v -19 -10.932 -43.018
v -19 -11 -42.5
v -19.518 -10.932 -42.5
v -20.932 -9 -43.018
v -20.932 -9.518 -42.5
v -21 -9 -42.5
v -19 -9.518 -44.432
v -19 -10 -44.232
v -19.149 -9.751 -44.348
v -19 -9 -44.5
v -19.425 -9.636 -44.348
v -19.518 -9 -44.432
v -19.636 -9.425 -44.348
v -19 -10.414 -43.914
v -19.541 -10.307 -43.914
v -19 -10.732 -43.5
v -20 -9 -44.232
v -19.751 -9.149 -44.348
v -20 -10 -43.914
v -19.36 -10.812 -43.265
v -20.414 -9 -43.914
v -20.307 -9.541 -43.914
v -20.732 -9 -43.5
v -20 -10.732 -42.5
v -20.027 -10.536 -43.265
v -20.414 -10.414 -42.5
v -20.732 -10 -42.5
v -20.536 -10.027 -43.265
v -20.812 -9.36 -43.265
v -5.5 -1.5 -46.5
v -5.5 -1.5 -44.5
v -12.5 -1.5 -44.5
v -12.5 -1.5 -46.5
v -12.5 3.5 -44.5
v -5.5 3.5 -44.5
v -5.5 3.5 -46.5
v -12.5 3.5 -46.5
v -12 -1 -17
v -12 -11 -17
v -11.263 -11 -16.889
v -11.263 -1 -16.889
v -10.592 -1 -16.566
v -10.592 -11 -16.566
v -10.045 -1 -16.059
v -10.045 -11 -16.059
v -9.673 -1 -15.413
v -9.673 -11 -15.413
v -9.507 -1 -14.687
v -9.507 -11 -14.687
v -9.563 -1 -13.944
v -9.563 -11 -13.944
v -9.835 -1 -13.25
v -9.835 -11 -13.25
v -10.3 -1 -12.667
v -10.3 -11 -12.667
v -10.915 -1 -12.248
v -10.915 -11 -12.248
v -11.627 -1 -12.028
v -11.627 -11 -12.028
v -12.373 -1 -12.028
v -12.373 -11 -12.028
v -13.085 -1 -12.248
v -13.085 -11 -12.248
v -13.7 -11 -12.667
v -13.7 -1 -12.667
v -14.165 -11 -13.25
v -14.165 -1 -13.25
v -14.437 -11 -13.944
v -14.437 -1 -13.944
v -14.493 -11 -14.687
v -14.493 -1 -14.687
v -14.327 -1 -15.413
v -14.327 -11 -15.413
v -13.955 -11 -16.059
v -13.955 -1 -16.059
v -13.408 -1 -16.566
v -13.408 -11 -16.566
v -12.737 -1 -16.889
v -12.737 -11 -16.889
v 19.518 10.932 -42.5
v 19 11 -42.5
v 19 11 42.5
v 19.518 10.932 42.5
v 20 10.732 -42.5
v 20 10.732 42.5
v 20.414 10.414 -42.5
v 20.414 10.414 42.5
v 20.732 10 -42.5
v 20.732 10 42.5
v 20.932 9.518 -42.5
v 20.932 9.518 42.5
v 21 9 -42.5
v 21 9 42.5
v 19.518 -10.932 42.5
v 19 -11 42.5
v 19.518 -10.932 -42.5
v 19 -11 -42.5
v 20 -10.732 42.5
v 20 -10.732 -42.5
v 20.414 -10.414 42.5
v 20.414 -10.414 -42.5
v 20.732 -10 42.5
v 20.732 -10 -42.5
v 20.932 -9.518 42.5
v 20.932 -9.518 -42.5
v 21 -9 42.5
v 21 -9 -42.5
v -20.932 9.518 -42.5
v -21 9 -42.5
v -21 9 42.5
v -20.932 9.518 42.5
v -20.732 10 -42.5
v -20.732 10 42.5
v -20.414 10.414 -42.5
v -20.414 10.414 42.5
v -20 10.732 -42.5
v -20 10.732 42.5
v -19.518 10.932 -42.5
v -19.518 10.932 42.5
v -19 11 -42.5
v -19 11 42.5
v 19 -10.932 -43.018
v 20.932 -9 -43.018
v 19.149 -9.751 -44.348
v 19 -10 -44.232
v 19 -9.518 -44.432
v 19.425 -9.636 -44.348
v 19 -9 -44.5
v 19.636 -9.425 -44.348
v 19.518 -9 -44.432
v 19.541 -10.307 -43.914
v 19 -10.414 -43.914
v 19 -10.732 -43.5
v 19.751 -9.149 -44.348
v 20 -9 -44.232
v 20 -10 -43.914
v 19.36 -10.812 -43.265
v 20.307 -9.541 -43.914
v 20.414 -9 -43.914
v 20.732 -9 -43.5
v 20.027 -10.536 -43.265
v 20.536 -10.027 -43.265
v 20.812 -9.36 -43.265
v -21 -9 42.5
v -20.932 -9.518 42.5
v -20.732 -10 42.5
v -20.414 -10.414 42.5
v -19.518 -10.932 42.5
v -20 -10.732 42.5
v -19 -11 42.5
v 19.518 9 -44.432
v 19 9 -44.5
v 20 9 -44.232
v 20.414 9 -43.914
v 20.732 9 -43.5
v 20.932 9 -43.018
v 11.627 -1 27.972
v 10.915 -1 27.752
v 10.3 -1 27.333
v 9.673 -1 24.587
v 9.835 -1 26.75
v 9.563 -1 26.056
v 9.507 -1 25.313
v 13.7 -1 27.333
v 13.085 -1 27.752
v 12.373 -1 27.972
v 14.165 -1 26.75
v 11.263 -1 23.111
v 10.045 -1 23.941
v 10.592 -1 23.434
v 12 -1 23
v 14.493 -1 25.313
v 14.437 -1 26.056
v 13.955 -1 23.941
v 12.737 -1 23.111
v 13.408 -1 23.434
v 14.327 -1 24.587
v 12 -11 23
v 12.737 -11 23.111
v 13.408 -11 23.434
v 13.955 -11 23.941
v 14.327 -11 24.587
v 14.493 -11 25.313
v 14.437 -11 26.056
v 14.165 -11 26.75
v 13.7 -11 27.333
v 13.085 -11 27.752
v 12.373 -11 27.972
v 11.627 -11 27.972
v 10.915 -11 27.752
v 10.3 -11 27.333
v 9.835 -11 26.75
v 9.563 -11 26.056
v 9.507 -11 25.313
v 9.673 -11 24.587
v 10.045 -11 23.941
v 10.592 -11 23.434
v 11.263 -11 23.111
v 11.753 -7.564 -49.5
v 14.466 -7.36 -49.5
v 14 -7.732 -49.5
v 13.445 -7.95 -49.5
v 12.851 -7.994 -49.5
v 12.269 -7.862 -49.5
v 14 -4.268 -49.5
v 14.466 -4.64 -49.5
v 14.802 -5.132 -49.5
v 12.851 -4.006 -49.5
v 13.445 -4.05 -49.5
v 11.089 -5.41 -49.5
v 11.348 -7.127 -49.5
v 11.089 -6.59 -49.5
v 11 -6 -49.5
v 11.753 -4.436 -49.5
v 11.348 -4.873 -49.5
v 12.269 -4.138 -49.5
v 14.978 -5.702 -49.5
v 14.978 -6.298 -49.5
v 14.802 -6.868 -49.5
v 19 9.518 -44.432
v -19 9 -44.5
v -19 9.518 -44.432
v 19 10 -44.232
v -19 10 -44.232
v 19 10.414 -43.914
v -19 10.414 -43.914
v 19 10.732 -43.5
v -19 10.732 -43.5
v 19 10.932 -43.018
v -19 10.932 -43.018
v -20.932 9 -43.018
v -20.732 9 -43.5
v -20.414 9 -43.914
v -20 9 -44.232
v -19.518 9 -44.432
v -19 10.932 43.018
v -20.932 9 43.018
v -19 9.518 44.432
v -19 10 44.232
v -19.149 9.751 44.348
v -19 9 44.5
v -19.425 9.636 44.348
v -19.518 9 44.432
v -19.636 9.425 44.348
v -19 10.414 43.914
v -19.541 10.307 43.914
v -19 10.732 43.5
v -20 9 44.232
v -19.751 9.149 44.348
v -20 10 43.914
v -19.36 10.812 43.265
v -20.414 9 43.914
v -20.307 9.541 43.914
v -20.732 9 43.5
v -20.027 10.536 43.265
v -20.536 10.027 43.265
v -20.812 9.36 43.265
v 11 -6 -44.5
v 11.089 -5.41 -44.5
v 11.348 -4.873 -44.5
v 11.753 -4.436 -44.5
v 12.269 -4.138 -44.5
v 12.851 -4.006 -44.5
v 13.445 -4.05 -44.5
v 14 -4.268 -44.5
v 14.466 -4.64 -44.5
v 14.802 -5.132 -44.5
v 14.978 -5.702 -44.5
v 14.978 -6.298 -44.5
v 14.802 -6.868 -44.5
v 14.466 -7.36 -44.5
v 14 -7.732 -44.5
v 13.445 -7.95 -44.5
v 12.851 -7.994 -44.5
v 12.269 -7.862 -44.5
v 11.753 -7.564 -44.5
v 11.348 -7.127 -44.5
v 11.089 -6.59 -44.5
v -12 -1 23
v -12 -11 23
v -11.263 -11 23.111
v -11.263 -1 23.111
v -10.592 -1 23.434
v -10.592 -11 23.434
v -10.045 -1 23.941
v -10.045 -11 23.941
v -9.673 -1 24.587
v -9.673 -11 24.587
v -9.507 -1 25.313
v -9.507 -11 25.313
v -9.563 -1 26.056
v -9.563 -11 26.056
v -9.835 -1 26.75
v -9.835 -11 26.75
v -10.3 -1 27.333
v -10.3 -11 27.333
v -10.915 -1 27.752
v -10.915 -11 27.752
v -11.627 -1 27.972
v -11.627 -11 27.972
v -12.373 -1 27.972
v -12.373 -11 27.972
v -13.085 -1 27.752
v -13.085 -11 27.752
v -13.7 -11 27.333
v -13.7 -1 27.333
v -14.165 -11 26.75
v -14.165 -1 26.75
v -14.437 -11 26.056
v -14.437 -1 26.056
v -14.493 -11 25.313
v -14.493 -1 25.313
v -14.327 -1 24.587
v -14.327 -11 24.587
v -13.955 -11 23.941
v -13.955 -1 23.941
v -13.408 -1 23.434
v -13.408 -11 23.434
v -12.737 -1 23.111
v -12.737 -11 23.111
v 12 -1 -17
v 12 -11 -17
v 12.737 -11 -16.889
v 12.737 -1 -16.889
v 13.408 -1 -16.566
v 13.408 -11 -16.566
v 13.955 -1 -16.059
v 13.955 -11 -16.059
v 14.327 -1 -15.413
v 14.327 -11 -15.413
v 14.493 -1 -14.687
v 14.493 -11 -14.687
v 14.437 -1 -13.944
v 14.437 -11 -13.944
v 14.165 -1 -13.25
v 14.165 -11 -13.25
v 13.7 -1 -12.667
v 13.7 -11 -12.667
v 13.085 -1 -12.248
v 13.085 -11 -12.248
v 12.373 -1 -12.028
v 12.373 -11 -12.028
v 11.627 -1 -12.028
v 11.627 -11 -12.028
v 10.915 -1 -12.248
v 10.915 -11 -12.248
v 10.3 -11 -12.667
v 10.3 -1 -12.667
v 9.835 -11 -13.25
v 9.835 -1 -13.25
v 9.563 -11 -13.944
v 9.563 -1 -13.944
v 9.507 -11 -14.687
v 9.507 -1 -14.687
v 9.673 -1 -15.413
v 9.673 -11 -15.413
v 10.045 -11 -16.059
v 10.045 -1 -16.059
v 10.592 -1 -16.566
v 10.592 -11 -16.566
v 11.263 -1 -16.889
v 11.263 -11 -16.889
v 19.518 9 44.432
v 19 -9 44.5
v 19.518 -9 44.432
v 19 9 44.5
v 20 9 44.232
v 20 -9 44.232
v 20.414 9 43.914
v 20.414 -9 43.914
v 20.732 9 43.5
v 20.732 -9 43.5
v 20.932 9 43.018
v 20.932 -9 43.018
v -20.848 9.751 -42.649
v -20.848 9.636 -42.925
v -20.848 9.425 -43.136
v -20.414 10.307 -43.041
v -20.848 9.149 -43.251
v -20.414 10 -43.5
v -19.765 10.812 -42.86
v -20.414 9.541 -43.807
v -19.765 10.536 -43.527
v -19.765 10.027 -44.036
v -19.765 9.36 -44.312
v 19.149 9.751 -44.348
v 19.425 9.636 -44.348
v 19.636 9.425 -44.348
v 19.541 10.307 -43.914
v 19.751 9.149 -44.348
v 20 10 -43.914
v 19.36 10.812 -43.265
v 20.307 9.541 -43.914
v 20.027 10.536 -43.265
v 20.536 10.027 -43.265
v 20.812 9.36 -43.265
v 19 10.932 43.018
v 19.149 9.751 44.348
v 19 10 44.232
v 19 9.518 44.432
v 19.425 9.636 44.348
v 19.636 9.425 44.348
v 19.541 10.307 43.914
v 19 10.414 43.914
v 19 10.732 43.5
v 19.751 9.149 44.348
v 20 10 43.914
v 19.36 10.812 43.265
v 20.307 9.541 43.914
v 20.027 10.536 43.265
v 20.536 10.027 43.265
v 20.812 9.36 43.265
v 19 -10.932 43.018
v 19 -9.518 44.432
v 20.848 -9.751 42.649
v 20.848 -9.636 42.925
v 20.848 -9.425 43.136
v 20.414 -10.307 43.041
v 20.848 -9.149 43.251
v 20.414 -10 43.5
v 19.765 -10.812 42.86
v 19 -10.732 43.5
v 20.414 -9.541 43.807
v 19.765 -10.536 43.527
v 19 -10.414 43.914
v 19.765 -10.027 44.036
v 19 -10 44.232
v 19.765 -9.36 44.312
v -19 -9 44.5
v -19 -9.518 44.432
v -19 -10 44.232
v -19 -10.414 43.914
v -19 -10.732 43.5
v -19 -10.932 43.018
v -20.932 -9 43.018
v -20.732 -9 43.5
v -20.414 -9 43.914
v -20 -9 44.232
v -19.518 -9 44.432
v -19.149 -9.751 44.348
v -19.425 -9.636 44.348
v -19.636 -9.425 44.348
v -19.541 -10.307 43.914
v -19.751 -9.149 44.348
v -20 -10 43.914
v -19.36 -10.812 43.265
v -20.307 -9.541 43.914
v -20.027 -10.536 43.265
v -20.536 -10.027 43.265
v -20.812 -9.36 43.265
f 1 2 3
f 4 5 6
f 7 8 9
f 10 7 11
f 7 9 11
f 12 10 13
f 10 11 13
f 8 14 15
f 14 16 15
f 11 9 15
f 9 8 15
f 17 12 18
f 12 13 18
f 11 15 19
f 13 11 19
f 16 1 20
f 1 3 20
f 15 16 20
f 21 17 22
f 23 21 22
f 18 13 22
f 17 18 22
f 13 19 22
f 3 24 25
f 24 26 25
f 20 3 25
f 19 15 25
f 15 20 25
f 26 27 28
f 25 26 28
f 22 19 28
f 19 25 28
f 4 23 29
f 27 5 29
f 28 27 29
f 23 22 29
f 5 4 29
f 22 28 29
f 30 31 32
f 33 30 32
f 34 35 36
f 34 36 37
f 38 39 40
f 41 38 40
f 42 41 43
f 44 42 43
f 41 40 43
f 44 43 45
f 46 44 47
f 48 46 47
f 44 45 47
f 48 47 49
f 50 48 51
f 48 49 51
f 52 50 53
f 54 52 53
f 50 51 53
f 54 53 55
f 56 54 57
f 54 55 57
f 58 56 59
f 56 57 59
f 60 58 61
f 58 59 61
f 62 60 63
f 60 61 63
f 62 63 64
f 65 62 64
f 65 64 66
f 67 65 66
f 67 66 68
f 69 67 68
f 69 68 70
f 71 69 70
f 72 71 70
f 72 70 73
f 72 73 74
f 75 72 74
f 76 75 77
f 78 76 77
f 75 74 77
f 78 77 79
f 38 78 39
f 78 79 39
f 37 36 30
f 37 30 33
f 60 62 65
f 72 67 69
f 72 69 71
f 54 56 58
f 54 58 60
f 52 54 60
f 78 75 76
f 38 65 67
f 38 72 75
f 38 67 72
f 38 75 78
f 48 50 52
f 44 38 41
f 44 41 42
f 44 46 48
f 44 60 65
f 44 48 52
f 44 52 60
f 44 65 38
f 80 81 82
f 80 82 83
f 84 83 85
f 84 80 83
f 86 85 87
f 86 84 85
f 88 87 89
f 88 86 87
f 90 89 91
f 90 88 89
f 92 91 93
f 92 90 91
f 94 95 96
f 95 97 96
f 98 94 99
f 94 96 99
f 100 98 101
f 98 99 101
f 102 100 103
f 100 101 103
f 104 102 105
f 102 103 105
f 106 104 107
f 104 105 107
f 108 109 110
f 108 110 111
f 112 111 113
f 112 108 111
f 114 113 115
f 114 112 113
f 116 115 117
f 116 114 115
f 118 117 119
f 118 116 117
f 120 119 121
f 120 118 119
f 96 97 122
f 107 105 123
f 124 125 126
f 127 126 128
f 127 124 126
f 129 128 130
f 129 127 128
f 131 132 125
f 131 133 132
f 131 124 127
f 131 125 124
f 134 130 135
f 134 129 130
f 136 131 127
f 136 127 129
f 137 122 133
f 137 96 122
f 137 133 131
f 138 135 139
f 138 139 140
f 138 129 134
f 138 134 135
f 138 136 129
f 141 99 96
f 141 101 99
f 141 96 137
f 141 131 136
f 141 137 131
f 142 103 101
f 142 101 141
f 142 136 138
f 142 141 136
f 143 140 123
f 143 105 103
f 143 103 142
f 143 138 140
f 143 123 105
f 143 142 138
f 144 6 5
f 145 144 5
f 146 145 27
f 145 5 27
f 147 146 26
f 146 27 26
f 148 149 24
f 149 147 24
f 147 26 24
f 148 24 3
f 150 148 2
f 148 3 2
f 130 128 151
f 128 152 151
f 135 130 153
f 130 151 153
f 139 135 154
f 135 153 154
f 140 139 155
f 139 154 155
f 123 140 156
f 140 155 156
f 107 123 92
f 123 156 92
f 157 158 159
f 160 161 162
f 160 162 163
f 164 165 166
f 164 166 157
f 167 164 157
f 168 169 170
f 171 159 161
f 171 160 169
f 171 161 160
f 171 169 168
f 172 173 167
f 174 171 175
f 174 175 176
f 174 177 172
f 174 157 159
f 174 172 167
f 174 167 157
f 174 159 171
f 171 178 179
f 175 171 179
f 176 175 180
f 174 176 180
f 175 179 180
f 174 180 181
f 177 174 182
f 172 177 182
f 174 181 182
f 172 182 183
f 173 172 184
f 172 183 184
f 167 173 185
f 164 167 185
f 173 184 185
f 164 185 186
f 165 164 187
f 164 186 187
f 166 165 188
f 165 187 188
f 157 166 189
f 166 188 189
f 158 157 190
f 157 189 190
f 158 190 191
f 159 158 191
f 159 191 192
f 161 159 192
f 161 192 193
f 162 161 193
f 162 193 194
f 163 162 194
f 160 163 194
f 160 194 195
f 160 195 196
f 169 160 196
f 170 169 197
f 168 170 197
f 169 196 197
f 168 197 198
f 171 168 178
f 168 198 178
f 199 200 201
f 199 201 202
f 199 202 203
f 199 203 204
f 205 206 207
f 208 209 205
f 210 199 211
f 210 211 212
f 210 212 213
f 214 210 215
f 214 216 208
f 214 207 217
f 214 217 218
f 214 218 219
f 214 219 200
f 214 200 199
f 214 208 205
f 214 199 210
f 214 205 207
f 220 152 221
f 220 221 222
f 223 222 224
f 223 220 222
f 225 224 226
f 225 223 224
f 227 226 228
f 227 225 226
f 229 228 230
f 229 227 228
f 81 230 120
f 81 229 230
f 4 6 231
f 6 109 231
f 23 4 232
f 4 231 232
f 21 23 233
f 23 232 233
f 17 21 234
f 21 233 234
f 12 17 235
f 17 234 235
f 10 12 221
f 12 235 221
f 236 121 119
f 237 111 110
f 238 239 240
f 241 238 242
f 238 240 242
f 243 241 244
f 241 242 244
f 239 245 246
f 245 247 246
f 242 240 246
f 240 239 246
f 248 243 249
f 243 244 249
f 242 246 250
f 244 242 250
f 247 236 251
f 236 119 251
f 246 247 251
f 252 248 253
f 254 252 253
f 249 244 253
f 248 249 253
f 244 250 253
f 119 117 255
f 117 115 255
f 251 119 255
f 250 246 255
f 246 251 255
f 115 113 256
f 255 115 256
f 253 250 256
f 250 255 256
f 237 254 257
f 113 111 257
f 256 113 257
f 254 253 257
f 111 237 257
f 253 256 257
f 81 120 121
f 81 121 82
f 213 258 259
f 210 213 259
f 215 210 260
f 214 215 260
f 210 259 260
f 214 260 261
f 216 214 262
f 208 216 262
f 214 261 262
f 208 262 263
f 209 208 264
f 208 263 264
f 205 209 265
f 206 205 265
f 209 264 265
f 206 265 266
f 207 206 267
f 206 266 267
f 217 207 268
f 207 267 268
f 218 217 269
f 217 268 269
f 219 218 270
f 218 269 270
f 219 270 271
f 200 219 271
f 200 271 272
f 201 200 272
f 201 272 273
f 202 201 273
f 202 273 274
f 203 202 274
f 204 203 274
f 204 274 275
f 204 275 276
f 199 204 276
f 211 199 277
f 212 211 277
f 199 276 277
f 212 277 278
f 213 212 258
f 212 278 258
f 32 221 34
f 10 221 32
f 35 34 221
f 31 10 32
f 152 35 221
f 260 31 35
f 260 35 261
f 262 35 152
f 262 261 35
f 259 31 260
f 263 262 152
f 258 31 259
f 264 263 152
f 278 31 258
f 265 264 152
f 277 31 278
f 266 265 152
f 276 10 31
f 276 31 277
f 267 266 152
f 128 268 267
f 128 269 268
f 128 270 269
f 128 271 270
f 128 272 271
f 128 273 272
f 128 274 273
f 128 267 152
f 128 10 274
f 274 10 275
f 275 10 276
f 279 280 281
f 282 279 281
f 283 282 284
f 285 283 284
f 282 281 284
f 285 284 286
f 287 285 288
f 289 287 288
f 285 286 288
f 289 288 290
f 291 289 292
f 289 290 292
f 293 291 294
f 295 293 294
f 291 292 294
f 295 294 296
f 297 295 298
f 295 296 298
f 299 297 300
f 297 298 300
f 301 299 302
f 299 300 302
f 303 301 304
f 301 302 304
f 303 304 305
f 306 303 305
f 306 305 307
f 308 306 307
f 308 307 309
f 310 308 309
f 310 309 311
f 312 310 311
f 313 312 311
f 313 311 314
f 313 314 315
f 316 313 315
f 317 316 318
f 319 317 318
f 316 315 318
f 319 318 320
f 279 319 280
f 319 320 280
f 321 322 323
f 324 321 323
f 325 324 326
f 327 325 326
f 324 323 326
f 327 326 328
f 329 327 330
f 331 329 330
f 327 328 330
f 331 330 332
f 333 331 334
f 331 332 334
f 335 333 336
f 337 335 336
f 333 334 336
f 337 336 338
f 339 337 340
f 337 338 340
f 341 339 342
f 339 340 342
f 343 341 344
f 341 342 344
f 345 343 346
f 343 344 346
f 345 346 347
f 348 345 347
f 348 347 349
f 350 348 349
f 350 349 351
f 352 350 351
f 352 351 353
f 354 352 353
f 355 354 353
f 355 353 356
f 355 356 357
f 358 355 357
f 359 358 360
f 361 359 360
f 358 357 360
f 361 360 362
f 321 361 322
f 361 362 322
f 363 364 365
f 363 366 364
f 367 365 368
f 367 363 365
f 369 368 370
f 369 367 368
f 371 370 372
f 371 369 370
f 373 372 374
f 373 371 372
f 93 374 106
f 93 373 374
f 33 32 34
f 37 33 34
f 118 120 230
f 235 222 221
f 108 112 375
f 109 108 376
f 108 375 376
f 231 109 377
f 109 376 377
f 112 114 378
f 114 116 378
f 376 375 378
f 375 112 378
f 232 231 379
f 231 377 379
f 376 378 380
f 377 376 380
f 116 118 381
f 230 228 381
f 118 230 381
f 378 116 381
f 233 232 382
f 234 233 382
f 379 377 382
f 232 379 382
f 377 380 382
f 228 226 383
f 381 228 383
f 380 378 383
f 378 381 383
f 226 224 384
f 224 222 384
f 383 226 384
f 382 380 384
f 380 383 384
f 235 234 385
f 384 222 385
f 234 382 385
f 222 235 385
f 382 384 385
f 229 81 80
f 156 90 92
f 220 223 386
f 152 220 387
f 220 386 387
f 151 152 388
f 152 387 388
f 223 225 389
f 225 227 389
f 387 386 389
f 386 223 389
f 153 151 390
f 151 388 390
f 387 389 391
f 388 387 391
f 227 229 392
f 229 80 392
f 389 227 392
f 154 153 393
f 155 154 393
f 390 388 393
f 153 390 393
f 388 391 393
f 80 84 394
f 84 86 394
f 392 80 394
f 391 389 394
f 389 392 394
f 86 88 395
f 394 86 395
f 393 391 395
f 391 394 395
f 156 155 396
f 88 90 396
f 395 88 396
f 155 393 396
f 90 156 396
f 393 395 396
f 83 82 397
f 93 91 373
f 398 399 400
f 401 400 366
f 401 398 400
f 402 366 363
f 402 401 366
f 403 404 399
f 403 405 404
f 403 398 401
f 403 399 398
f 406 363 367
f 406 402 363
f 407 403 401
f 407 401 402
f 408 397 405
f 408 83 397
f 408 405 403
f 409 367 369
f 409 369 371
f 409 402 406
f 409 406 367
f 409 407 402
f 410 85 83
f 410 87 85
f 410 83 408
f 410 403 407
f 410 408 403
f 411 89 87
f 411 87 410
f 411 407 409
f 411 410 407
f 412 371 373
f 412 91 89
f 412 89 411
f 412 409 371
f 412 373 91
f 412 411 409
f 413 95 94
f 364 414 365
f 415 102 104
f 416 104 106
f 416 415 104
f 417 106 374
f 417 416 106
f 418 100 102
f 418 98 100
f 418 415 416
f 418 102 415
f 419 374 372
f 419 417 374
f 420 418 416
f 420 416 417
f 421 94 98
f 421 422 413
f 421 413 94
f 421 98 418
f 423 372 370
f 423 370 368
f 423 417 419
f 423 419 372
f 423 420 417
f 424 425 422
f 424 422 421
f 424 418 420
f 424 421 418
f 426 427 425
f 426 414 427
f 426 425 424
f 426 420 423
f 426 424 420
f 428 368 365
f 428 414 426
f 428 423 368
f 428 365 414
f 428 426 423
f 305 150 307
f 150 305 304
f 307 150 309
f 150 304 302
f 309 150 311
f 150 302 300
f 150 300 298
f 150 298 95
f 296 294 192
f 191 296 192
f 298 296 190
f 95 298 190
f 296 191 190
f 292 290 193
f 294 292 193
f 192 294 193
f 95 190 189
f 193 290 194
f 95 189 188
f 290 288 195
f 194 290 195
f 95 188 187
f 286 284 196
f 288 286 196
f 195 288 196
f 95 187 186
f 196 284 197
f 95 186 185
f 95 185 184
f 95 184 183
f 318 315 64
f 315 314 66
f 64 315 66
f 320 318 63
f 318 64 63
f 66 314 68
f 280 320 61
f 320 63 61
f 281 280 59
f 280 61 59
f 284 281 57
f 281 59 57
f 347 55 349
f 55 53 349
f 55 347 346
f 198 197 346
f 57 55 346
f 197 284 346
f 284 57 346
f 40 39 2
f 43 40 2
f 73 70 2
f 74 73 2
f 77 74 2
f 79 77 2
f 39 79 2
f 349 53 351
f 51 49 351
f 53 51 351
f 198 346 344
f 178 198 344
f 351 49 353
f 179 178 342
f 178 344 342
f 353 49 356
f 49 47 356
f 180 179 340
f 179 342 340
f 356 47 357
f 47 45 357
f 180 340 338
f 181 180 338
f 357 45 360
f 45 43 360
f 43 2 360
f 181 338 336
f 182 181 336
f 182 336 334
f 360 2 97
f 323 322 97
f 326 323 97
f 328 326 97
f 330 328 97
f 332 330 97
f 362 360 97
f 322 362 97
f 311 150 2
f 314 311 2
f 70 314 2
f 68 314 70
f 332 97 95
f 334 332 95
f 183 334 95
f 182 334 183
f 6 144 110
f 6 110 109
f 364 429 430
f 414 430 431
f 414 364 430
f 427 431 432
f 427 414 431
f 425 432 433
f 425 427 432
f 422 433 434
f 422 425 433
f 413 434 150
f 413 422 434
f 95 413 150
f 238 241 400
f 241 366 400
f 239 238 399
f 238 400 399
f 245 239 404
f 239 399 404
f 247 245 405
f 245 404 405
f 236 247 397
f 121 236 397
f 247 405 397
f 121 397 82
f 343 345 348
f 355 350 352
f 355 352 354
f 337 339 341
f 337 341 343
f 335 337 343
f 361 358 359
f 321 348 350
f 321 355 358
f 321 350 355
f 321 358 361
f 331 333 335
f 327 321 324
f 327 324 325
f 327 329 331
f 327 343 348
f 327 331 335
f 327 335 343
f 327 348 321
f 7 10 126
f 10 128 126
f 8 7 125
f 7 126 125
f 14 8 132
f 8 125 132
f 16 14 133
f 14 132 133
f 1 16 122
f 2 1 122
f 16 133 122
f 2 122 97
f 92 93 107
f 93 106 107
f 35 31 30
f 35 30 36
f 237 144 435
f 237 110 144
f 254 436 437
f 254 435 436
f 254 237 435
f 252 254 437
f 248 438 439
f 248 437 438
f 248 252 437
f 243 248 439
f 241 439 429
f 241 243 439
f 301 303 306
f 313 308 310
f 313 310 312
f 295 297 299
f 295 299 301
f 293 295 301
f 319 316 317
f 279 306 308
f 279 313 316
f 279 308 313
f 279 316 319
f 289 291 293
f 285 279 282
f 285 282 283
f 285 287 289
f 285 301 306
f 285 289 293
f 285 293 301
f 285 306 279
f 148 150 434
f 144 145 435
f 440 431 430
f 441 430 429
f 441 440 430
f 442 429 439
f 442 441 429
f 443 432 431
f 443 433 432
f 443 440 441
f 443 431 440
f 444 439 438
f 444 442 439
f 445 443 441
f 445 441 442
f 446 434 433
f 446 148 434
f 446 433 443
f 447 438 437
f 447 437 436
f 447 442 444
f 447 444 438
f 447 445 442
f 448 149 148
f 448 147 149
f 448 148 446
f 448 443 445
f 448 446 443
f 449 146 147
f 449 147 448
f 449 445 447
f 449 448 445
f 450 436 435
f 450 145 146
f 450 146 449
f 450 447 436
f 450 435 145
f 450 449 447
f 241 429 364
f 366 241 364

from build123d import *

# Parameters (mm, degrees)
EXTRUDE_370_DEPTH      = 11
EXTRUDE_370_DEPTH_BACK = 11
SKETCH_1_W             = 42
SKETCH_1_H             = 89
SKETCH_2_W             = 7
SKETCH_2_H             = 5
EXTRUDE_597_DEPTH      = 2
SKETCH_3_R             = 2
EXTRUDE_827_DEPTH      = 5
SKETCH_4_R             = 2.5
CUT_EXTRUDE_1027_DEPTH = 10
FILLET_1_R             = 2


with BuildPart() as part:
    # Эскиз1 → Extrude 370 (new, two sides: drawn at the far end of the back side and taken through both)
    with BuildSketch(Plane(origin=(0, 0, 0), x_dir=(1, 0, 0), z_dir=(0, 1, 0)).offset(-EXTRUDE_370_DEPTH_BACK)):
        Rectangle(SKETCH_1_W, SKETCH_1_H)
    extrude(amount=EXTRUDE_370_DEPTH + EXTRUDE_370_DEPTH_BACK)

    # Эскиз2 → Extrude 597 (add)
    with BuildSketch(Plane(origin=(0, 0, -44.5), x_dir=(-1, 0, 0), z_dir=(0, 0, -1))):
        with Locations((9, 1)):
            Rectangle(SKETCH_2_W, SKETCH_2_H)
    extrude(amount=EXTRUDE_597_DEPTH)

    # Эскиз3 → Extrude 827 (add)
    with BuildSketch(Plane(origin=(0, 0, -44.5), x_dir=(-1, 0, 0), z_dir=(0, 0, -1))):
        with Locations((-13, -6)):
            Circle(SKETCH_3_R)
    extrude(amount=EXTRUDE_827_DEPTH)

    # Эскиз4 → Cut-Extrude 1027 (cut)
    with BuildSketch(Plane.XZ.offset(11)):
        with Locations((-12, 25.5)):
            Circle(SKETCH_4_R)
        with Locations((12, 25.5)):
            Circle(SKETCH_4_R)
        with Locations((12, -14.5)):
            Circle(SKETCH_4_R)
        with Locations((-12, -14.5)):
            Circle(SKETCH_4_R)
    extrude(amount=-CUT_EXTRUDE_1027_DEPTH, mode=Mode.SUBTRACT)

    # Скругление1
    fillet_1_edges = [part.edges().sort_by_distance(p)[0] for p in [
        (0, -11, -44.5),
        (-21, -11, 0),
        (-21, 0, -44.5),
        (21, -11, 0),
        (21, 0, -44.5),
        (0, -11, 44.5),
        (-21, 0, 44.5),
        (21, 0, 44.5),
        (0, 11, 44.5),
        (-21, 11, 0),
        (0, 11, -44.5),
        (21, 11, 0),
    ]]
    fillet(fillet_1_edges, radius=FILLET_1_R)


solid = part.part
